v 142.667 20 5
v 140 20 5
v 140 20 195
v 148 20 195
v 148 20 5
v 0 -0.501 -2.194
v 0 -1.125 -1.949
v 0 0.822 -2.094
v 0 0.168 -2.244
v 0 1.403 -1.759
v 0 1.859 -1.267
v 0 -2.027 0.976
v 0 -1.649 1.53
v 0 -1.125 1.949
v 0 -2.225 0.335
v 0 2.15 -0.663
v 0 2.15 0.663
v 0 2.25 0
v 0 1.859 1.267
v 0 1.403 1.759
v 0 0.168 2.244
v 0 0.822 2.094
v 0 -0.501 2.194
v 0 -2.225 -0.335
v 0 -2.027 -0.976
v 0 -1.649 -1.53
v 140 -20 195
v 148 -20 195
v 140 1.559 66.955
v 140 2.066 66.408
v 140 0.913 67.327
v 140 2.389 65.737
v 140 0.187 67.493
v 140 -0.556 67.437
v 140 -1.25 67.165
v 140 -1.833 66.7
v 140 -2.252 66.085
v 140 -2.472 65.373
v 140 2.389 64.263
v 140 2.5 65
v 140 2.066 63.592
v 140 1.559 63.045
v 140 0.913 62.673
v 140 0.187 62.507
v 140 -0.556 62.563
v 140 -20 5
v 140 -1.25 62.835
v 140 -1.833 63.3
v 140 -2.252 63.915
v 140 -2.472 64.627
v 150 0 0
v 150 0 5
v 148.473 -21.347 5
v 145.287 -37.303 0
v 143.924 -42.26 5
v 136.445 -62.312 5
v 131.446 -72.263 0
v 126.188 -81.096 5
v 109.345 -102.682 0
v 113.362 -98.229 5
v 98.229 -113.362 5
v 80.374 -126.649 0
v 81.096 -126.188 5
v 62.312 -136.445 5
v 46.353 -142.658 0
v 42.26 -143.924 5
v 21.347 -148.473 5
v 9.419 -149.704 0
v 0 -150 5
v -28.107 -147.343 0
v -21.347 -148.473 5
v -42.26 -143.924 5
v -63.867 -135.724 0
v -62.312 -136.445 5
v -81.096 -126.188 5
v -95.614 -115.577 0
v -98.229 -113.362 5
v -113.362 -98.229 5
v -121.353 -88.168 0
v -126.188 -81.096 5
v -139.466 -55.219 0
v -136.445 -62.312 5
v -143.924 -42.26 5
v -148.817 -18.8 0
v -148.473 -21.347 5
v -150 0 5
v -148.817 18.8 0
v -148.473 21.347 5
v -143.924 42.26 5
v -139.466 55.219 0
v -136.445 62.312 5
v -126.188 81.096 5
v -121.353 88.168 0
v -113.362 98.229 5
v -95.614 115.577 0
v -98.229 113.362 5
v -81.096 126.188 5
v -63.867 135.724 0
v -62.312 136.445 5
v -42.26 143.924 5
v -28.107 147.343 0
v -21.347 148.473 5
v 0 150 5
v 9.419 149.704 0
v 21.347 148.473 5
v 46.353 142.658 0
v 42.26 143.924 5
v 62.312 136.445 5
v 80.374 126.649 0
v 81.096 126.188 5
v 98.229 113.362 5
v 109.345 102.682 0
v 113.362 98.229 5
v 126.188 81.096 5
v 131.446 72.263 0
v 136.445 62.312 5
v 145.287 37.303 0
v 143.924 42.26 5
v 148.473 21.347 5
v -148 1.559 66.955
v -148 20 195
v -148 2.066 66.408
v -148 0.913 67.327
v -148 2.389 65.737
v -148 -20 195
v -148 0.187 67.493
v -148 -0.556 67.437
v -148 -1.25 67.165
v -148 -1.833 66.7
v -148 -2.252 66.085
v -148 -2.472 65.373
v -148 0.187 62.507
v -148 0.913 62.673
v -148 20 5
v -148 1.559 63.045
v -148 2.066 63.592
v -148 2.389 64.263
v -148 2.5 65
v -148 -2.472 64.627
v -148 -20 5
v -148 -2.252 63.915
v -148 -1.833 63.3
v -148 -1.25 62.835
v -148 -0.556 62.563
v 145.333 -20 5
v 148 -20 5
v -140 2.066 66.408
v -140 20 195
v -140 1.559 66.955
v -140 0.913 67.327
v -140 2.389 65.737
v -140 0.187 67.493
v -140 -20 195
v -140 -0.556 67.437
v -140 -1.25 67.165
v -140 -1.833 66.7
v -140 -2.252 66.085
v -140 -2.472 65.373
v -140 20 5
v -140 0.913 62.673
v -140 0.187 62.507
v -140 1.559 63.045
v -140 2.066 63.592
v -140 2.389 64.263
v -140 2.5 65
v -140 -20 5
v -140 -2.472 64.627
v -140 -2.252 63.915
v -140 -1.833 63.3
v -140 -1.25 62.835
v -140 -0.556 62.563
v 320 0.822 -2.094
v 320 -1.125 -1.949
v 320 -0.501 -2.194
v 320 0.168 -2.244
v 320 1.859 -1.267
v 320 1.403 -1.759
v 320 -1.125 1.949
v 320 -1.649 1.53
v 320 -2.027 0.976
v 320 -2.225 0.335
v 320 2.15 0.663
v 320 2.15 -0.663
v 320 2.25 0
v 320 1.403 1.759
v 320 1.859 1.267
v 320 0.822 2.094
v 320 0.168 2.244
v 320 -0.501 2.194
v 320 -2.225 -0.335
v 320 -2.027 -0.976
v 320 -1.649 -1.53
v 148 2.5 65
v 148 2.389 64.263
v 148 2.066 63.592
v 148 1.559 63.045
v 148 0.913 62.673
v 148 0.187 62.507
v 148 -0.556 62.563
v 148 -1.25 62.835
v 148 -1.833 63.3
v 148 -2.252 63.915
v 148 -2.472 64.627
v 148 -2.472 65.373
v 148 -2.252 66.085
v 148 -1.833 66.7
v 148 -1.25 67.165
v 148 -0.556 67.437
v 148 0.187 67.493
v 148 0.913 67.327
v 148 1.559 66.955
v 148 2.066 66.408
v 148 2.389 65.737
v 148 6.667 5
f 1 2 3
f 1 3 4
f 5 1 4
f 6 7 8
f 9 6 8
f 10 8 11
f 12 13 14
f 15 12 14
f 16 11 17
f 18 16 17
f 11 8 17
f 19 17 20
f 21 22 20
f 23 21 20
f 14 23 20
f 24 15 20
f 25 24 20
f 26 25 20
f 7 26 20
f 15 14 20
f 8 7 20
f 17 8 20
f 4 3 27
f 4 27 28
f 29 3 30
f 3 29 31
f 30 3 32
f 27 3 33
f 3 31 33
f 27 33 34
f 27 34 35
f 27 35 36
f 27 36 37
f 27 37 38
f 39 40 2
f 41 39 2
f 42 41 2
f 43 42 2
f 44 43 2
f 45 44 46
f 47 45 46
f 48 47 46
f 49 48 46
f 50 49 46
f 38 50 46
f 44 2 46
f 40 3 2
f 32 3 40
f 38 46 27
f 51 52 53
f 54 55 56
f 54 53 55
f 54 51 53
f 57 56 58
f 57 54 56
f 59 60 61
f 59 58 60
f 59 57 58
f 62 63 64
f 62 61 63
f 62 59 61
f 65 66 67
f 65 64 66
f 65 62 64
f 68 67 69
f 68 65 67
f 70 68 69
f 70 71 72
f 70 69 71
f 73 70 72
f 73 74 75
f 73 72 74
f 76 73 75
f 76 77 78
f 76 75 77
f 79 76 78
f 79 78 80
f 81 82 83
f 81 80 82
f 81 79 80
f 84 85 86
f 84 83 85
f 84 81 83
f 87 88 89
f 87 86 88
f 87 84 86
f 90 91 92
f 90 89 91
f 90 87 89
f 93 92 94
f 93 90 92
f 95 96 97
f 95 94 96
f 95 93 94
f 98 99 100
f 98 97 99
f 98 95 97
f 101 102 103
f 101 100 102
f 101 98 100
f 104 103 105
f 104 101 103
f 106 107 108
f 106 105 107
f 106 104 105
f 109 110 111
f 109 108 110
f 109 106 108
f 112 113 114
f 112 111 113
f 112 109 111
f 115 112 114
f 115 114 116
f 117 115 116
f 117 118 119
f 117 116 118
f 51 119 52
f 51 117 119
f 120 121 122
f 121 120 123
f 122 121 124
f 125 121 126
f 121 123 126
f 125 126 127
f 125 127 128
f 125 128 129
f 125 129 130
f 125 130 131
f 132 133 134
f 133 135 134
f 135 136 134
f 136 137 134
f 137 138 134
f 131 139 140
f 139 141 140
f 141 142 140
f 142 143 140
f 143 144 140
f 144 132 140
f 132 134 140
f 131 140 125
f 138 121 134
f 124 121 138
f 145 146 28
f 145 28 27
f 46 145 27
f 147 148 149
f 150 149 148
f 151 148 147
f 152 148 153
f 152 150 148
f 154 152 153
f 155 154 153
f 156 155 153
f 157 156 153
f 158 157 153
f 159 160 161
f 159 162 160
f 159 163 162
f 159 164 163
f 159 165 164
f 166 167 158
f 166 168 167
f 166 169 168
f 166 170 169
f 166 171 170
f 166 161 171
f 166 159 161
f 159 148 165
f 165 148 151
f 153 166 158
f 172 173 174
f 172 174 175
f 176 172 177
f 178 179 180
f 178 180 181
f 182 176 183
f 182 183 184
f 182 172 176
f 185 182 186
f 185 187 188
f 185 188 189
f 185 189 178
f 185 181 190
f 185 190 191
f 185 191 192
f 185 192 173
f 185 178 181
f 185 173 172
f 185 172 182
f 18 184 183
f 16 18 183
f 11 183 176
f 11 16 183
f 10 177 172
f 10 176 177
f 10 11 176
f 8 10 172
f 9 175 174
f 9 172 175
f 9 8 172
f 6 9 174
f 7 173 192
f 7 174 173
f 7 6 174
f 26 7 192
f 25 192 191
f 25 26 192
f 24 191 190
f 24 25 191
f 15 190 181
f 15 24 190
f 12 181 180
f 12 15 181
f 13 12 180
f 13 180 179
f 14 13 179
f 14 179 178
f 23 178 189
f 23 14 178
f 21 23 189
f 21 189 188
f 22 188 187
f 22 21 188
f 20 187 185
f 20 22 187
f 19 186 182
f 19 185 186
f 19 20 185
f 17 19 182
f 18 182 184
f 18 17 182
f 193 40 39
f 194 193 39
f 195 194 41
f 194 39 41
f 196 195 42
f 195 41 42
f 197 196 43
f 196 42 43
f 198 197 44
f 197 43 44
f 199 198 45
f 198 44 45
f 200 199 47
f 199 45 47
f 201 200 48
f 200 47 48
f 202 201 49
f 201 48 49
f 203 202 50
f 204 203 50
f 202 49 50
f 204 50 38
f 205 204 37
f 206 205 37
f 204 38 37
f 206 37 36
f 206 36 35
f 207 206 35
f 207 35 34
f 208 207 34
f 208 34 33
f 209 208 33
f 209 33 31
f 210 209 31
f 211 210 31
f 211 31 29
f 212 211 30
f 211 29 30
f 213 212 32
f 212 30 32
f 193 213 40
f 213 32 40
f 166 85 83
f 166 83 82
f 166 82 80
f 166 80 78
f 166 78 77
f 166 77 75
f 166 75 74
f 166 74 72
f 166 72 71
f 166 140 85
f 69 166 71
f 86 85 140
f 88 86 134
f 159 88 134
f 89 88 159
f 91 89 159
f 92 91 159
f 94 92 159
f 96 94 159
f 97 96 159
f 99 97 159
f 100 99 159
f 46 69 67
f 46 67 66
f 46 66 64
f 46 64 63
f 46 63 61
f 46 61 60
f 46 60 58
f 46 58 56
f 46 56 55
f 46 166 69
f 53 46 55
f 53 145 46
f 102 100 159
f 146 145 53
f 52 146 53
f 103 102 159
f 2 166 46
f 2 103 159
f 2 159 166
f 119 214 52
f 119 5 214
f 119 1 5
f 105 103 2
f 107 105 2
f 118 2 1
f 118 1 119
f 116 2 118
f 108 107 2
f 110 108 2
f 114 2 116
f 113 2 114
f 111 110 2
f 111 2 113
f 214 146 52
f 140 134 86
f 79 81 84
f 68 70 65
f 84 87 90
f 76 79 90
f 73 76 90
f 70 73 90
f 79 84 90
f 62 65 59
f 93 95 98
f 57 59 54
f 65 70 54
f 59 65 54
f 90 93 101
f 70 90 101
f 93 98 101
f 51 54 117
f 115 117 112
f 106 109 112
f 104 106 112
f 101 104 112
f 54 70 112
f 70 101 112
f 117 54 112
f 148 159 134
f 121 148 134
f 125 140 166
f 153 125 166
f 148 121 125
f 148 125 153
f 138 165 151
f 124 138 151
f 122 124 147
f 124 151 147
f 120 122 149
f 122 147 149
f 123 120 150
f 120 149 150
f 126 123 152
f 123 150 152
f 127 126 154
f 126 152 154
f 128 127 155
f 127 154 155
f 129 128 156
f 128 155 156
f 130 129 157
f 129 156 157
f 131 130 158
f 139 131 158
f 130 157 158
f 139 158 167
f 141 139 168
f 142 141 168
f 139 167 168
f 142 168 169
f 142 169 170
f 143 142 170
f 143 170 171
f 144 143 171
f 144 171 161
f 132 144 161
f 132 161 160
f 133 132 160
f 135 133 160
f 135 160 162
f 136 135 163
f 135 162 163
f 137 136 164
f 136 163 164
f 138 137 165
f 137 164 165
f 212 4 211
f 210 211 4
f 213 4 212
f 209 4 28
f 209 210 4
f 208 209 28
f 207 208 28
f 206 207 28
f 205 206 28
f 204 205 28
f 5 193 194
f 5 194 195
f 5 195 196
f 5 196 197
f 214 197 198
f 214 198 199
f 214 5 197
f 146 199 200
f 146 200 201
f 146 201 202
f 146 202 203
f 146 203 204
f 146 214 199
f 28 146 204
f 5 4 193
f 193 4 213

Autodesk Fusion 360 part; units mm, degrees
sketch "Baza" plane through (0, 0, 0) normal (0, 0, 1) x (1, 0, 0)
  circle A0 centre (0, 0) radius 150
  line L0 (0, 0) -> (0, 150) construction
  line L1 (0, 0) -> (-140, 0) construction
  line L2 (-140, 0) -> (-140, -20)
  line L3 (-140, 0) -> (-140, 20)
  line L4 (-140, 20) -> (-148, 20)
  line L5 (-148, 20) -> (-148, -20)
  line L6 (-148, -20) -> (-140, -20)
  line L7 (148, 20) -> (148, -20)
  line L8 (140, 0) -> (140, 20)
  line L9 (140, 0) -> (140, -20)
  line L10 (140, 20) -> (148, 20)
  line L11 (148, -20) -> (140, -20)
  dimension "d1" = 300
  dimension "d2" = 140
  dimension "d3" = 20
  dimension "d4" = 20
  dimension "d5" = 8
extrude "Extrude1" add sketch "Baza" along normal blind 190 from surface at 5 contours L2 L3 L4 L5 L6 | L7 L8 L9 L10 L11 makes body 1 at (-140, 6.6667, 68.3333) makes body 2 at (148, 6.6667, 68.3333)
extrude "Extrude2" add sketch "Baza" along normal blind 5 contours A0 | L2 L3 L4 L5 L6 | L7 L8 L9 L10 L11 bodies 1 2
sketch "side_hole" plane through (-140, 0, 0) normal (1, 0, 0) x (0, 1, 0)
  line L0 (-20, 5) -> (20, 5)
  line L1 (20, 5) -> (20, 195)
  line L2 (20, 195) -> (-20, 195)
  line L3 (-20, 195) -> (-20, 5)
  line L4 (0, 5) -> (0, 65) construction
  circle A0 centre (0, 65) radius 2.5
  dimension "d12" = 60
  dimension "d13" = 5
extrude "Extrude3" cut sketch "side_hole" along normal blind 600 and the other way blind 100 contours A0 bodies 1
copy_body "Body->Comp1" bodies 1 removing the originals makes body 3 in component "Baza+laterale"
component "Baza+laterale" placed x (1, 0, 0) y (0, 1, 0) z (0, 0, 1) at (0, 0, 0)

Autodesk Fusion 360 part; units mm, degrees
sketch "Bara_32cm" plane through (0, 0, 0) normal (1, 0, 0) x (0, 1, 0)
  circle A0 centre (0, 0) radius 2.25
  dimension "d1" = 4.5
extrude "Extrude1" add sketch "Bara_32cm" along normal blind 320
component "bara_32cm (1)" placed x (1, 0, 0) y (0, 1, 0) z (0, 0, 1) at (0, 0, 0)
